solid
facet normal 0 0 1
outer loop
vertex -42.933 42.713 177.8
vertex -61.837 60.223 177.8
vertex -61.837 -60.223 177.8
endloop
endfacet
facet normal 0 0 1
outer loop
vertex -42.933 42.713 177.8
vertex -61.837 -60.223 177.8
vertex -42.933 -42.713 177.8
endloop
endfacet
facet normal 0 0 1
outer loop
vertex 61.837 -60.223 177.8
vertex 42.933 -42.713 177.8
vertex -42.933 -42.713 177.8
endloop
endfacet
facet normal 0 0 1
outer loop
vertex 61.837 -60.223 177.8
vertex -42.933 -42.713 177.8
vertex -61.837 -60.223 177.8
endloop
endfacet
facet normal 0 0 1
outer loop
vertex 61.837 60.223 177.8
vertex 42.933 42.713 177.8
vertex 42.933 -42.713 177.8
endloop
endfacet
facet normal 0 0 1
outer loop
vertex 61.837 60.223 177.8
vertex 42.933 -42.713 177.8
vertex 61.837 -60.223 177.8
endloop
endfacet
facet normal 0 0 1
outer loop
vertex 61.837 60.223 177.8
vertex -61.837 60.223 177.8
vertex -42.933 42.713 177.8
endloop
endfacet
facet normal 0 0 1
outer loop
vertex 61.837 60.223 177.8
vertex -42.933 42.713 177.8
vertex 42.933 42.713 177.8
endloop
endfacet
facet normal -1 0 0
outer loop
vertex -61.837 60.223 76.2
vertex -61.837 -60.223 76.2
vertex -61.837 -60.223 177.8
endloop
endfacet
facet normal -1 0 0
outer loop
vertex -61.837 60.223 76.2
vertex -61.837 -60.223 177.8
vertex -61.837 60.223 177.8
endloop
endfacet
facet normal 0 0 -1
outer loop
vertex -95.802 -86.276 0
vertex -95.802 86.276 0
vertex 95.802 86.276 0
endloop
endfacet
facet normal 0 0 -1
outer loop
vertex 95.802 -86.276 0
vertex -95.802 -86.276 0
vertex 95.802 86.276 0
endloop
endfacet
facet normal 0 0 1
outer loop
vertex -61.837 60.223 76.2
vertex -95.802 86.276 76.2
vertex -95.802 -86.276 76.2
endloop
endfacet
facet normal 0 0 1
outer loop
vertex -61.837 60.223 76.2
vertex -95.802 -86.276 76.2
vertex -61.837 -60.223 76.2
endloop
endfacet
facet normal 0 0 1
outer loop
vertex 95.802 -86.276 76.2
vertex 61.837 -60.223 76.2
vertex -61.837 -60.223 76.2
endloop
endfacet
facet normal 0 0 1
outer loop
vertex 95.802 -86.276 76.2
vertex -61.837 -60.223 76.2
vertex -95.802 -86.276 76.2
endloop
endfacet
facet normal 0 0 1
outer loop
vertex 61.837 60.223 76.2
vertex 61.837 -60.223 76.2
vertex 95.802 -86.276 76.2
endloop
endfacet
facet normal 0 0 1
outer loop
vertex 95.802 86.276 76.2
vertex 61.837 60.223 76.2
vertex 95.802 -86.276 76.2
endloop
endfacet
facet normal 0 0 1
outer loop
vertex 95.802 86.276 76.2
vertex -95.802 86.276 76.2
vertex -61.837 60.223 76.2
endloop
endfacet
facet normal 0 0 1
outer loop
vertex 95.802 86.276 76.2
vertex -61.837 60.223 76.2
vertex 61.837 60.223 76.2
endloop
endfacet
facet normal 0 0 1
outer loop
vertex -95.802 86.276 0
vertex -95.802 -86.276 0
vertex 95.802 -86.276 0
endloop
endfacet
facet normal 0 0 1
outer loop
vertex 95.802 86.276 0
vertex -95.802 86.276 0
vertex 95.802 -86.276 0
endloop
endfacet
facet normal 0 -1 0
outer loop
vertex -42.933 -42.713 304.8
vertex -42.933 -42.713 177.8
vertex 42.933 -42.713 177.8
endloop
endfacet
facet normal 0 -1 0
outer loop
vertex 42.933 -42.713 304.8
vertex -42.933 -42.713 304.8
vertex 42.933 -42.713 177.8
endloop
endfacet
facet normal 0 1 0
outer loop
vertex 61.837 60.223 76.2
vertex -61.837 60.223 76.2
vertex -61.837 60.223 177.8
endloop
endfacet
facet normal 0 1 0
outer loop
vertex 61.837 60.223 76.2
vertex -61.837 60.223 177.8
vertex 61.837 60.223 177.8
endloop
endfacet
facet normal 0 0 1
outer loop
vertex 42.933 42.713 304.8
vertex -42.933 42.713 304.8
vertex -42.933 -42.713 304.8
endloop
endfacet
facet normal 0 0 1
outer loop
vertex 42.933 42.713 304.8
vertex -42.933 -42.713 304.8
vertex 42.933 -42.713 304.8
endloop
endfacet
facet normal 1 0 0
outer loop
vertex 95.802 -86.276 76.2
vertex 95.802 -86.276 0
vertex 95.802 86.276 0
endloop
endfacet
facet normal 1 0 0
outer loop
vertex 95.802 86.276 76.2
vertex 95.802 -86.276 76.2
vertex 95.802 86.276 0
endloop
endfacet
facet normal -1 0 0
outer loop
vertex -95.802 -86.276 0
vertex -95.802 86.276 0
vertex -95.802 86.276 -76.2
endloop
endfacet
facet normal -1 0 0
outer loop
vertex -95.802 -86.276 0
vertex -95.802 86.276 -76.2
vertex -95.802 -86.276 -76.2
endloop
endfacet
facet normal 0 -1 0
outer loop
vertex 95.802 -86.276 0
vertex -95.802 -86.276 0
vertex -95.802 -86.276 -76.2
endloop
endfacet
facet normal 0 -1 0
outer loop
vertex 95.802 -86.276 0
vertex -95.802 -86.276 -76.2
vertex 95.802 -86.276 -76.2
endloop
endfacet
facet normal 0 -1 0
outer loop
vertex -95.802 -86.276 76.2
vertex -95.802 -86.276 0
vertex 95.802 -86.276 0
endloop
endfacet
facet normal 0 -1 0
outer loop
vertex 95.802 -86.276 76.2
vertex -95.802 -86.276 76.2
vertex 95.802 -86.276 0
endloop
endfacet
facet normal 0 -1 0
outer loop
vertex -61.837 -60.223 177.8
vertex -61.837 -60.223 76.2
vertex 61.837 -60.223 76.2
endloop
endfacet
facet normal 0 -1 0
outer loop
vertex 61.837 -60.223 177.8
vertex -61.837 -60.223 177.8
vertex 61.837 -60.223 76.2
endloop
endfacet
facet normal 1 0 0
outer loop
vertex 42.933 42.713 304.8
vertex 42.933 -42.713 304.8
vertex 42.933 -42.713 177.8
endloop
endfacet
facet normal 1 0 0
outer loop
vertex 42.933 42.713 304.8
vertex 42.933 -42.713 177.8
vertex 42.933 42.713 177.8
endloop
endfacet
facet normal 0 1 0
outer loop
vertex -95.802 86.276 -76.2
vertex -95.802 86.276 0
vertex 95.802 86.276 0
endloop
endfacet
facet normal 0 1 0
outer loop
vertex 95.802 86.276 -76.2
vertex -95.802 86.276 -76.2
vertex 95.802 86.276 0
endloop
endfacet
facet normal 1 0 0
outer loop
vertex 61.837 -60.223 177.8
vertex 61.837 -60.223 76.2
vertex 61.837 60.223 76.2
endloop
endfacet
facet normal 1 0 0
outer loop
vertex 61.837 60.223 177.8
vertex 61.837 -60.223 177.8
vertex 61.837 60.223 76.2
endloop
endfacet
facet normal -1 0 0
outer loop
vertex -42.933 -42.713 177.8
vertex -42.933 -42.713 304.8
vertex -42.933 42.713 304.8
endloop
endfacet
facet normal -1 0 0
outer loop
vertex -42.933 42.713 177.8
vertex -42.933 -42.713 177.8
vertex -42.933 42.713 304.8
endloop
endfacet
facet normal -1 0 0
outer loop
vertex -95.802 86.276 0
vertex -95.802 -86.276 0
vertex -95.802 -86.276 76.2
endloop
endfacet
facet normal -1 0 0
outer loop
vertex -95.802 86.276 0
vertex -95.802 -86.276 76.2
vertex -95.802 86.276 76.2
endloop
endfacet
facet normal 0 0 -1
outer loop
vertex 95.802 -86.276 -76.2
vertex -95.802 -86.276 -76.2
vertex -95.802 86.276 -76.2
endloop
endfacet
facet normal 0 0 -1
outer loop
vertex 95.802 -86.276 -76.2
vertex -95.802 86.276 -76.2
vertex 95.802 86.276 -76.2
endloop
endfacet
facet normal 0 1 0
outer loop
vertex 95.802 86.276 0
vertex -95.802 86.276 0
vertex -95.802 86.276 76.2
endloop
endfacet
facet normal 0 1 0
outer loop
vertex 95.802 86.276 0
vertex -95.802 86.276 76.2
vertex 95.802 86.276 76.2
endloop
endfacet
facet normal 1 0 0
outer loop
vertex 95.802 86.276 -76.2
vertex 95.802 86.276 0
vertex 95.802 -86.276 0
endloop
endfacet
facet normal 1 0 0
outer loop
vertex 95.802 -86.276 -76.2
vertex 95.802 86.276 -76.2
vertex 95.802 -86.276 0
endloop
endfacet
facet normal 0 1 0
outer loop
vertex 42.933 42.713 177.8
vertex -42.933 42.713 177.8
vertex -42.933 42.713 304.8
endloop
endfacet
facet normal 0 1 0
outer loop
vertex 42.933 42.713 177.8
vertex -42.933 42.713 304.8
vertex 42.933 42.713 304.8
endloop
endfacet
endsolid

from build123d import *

# Parameters (mm, degrees)
F0_W     = 123.674608
F0_H     = 120.4468
F1_DEPTH = 177.8
F2_W     = 85.865312
F2_H     = 85.42654
F3_DEPTH = 127
F4_W     = 191.604674
F4_H     = 172.551454
F5_DEPTH = 76.2
F6_W     = 191.604674
F6_H     = 172.551454
F7_DEPTH = 76.2


with BuildPart() as f1:
    # F0 (on Top) → F1 (new body)
    with BuildSketch(Plane.XY):
        Rectangle(F0_W, F0_H)
    extrude(amount=F1_DEPTH)

    # F2 (on face) → F3 (join)
    with BuildSketch(Plane.XY.offset(177.8)):
        Rectangle(F2_W, F2_H)
    extrude(amount=F3_DEPTH)

    # F4 (on face) → F5 (join)
    with BuildSketch(Plane.XY):
        Rectangle(F4_W, F4_H)
    extrude(amount=F5_DEPTH)


with BuildPart() as f7:
    # F6 (on face) → F7 (new body)
    with BuildSketch(Plane(origin=(0, 0, 0), x_dir=(1, 0, 0), z_dir=(0, 0, -1))):
        Rectangle(F6_W, F6_H)
    extrude(amount=F7_DEPTH)


solid = Compound([f1.part, f7.part])
